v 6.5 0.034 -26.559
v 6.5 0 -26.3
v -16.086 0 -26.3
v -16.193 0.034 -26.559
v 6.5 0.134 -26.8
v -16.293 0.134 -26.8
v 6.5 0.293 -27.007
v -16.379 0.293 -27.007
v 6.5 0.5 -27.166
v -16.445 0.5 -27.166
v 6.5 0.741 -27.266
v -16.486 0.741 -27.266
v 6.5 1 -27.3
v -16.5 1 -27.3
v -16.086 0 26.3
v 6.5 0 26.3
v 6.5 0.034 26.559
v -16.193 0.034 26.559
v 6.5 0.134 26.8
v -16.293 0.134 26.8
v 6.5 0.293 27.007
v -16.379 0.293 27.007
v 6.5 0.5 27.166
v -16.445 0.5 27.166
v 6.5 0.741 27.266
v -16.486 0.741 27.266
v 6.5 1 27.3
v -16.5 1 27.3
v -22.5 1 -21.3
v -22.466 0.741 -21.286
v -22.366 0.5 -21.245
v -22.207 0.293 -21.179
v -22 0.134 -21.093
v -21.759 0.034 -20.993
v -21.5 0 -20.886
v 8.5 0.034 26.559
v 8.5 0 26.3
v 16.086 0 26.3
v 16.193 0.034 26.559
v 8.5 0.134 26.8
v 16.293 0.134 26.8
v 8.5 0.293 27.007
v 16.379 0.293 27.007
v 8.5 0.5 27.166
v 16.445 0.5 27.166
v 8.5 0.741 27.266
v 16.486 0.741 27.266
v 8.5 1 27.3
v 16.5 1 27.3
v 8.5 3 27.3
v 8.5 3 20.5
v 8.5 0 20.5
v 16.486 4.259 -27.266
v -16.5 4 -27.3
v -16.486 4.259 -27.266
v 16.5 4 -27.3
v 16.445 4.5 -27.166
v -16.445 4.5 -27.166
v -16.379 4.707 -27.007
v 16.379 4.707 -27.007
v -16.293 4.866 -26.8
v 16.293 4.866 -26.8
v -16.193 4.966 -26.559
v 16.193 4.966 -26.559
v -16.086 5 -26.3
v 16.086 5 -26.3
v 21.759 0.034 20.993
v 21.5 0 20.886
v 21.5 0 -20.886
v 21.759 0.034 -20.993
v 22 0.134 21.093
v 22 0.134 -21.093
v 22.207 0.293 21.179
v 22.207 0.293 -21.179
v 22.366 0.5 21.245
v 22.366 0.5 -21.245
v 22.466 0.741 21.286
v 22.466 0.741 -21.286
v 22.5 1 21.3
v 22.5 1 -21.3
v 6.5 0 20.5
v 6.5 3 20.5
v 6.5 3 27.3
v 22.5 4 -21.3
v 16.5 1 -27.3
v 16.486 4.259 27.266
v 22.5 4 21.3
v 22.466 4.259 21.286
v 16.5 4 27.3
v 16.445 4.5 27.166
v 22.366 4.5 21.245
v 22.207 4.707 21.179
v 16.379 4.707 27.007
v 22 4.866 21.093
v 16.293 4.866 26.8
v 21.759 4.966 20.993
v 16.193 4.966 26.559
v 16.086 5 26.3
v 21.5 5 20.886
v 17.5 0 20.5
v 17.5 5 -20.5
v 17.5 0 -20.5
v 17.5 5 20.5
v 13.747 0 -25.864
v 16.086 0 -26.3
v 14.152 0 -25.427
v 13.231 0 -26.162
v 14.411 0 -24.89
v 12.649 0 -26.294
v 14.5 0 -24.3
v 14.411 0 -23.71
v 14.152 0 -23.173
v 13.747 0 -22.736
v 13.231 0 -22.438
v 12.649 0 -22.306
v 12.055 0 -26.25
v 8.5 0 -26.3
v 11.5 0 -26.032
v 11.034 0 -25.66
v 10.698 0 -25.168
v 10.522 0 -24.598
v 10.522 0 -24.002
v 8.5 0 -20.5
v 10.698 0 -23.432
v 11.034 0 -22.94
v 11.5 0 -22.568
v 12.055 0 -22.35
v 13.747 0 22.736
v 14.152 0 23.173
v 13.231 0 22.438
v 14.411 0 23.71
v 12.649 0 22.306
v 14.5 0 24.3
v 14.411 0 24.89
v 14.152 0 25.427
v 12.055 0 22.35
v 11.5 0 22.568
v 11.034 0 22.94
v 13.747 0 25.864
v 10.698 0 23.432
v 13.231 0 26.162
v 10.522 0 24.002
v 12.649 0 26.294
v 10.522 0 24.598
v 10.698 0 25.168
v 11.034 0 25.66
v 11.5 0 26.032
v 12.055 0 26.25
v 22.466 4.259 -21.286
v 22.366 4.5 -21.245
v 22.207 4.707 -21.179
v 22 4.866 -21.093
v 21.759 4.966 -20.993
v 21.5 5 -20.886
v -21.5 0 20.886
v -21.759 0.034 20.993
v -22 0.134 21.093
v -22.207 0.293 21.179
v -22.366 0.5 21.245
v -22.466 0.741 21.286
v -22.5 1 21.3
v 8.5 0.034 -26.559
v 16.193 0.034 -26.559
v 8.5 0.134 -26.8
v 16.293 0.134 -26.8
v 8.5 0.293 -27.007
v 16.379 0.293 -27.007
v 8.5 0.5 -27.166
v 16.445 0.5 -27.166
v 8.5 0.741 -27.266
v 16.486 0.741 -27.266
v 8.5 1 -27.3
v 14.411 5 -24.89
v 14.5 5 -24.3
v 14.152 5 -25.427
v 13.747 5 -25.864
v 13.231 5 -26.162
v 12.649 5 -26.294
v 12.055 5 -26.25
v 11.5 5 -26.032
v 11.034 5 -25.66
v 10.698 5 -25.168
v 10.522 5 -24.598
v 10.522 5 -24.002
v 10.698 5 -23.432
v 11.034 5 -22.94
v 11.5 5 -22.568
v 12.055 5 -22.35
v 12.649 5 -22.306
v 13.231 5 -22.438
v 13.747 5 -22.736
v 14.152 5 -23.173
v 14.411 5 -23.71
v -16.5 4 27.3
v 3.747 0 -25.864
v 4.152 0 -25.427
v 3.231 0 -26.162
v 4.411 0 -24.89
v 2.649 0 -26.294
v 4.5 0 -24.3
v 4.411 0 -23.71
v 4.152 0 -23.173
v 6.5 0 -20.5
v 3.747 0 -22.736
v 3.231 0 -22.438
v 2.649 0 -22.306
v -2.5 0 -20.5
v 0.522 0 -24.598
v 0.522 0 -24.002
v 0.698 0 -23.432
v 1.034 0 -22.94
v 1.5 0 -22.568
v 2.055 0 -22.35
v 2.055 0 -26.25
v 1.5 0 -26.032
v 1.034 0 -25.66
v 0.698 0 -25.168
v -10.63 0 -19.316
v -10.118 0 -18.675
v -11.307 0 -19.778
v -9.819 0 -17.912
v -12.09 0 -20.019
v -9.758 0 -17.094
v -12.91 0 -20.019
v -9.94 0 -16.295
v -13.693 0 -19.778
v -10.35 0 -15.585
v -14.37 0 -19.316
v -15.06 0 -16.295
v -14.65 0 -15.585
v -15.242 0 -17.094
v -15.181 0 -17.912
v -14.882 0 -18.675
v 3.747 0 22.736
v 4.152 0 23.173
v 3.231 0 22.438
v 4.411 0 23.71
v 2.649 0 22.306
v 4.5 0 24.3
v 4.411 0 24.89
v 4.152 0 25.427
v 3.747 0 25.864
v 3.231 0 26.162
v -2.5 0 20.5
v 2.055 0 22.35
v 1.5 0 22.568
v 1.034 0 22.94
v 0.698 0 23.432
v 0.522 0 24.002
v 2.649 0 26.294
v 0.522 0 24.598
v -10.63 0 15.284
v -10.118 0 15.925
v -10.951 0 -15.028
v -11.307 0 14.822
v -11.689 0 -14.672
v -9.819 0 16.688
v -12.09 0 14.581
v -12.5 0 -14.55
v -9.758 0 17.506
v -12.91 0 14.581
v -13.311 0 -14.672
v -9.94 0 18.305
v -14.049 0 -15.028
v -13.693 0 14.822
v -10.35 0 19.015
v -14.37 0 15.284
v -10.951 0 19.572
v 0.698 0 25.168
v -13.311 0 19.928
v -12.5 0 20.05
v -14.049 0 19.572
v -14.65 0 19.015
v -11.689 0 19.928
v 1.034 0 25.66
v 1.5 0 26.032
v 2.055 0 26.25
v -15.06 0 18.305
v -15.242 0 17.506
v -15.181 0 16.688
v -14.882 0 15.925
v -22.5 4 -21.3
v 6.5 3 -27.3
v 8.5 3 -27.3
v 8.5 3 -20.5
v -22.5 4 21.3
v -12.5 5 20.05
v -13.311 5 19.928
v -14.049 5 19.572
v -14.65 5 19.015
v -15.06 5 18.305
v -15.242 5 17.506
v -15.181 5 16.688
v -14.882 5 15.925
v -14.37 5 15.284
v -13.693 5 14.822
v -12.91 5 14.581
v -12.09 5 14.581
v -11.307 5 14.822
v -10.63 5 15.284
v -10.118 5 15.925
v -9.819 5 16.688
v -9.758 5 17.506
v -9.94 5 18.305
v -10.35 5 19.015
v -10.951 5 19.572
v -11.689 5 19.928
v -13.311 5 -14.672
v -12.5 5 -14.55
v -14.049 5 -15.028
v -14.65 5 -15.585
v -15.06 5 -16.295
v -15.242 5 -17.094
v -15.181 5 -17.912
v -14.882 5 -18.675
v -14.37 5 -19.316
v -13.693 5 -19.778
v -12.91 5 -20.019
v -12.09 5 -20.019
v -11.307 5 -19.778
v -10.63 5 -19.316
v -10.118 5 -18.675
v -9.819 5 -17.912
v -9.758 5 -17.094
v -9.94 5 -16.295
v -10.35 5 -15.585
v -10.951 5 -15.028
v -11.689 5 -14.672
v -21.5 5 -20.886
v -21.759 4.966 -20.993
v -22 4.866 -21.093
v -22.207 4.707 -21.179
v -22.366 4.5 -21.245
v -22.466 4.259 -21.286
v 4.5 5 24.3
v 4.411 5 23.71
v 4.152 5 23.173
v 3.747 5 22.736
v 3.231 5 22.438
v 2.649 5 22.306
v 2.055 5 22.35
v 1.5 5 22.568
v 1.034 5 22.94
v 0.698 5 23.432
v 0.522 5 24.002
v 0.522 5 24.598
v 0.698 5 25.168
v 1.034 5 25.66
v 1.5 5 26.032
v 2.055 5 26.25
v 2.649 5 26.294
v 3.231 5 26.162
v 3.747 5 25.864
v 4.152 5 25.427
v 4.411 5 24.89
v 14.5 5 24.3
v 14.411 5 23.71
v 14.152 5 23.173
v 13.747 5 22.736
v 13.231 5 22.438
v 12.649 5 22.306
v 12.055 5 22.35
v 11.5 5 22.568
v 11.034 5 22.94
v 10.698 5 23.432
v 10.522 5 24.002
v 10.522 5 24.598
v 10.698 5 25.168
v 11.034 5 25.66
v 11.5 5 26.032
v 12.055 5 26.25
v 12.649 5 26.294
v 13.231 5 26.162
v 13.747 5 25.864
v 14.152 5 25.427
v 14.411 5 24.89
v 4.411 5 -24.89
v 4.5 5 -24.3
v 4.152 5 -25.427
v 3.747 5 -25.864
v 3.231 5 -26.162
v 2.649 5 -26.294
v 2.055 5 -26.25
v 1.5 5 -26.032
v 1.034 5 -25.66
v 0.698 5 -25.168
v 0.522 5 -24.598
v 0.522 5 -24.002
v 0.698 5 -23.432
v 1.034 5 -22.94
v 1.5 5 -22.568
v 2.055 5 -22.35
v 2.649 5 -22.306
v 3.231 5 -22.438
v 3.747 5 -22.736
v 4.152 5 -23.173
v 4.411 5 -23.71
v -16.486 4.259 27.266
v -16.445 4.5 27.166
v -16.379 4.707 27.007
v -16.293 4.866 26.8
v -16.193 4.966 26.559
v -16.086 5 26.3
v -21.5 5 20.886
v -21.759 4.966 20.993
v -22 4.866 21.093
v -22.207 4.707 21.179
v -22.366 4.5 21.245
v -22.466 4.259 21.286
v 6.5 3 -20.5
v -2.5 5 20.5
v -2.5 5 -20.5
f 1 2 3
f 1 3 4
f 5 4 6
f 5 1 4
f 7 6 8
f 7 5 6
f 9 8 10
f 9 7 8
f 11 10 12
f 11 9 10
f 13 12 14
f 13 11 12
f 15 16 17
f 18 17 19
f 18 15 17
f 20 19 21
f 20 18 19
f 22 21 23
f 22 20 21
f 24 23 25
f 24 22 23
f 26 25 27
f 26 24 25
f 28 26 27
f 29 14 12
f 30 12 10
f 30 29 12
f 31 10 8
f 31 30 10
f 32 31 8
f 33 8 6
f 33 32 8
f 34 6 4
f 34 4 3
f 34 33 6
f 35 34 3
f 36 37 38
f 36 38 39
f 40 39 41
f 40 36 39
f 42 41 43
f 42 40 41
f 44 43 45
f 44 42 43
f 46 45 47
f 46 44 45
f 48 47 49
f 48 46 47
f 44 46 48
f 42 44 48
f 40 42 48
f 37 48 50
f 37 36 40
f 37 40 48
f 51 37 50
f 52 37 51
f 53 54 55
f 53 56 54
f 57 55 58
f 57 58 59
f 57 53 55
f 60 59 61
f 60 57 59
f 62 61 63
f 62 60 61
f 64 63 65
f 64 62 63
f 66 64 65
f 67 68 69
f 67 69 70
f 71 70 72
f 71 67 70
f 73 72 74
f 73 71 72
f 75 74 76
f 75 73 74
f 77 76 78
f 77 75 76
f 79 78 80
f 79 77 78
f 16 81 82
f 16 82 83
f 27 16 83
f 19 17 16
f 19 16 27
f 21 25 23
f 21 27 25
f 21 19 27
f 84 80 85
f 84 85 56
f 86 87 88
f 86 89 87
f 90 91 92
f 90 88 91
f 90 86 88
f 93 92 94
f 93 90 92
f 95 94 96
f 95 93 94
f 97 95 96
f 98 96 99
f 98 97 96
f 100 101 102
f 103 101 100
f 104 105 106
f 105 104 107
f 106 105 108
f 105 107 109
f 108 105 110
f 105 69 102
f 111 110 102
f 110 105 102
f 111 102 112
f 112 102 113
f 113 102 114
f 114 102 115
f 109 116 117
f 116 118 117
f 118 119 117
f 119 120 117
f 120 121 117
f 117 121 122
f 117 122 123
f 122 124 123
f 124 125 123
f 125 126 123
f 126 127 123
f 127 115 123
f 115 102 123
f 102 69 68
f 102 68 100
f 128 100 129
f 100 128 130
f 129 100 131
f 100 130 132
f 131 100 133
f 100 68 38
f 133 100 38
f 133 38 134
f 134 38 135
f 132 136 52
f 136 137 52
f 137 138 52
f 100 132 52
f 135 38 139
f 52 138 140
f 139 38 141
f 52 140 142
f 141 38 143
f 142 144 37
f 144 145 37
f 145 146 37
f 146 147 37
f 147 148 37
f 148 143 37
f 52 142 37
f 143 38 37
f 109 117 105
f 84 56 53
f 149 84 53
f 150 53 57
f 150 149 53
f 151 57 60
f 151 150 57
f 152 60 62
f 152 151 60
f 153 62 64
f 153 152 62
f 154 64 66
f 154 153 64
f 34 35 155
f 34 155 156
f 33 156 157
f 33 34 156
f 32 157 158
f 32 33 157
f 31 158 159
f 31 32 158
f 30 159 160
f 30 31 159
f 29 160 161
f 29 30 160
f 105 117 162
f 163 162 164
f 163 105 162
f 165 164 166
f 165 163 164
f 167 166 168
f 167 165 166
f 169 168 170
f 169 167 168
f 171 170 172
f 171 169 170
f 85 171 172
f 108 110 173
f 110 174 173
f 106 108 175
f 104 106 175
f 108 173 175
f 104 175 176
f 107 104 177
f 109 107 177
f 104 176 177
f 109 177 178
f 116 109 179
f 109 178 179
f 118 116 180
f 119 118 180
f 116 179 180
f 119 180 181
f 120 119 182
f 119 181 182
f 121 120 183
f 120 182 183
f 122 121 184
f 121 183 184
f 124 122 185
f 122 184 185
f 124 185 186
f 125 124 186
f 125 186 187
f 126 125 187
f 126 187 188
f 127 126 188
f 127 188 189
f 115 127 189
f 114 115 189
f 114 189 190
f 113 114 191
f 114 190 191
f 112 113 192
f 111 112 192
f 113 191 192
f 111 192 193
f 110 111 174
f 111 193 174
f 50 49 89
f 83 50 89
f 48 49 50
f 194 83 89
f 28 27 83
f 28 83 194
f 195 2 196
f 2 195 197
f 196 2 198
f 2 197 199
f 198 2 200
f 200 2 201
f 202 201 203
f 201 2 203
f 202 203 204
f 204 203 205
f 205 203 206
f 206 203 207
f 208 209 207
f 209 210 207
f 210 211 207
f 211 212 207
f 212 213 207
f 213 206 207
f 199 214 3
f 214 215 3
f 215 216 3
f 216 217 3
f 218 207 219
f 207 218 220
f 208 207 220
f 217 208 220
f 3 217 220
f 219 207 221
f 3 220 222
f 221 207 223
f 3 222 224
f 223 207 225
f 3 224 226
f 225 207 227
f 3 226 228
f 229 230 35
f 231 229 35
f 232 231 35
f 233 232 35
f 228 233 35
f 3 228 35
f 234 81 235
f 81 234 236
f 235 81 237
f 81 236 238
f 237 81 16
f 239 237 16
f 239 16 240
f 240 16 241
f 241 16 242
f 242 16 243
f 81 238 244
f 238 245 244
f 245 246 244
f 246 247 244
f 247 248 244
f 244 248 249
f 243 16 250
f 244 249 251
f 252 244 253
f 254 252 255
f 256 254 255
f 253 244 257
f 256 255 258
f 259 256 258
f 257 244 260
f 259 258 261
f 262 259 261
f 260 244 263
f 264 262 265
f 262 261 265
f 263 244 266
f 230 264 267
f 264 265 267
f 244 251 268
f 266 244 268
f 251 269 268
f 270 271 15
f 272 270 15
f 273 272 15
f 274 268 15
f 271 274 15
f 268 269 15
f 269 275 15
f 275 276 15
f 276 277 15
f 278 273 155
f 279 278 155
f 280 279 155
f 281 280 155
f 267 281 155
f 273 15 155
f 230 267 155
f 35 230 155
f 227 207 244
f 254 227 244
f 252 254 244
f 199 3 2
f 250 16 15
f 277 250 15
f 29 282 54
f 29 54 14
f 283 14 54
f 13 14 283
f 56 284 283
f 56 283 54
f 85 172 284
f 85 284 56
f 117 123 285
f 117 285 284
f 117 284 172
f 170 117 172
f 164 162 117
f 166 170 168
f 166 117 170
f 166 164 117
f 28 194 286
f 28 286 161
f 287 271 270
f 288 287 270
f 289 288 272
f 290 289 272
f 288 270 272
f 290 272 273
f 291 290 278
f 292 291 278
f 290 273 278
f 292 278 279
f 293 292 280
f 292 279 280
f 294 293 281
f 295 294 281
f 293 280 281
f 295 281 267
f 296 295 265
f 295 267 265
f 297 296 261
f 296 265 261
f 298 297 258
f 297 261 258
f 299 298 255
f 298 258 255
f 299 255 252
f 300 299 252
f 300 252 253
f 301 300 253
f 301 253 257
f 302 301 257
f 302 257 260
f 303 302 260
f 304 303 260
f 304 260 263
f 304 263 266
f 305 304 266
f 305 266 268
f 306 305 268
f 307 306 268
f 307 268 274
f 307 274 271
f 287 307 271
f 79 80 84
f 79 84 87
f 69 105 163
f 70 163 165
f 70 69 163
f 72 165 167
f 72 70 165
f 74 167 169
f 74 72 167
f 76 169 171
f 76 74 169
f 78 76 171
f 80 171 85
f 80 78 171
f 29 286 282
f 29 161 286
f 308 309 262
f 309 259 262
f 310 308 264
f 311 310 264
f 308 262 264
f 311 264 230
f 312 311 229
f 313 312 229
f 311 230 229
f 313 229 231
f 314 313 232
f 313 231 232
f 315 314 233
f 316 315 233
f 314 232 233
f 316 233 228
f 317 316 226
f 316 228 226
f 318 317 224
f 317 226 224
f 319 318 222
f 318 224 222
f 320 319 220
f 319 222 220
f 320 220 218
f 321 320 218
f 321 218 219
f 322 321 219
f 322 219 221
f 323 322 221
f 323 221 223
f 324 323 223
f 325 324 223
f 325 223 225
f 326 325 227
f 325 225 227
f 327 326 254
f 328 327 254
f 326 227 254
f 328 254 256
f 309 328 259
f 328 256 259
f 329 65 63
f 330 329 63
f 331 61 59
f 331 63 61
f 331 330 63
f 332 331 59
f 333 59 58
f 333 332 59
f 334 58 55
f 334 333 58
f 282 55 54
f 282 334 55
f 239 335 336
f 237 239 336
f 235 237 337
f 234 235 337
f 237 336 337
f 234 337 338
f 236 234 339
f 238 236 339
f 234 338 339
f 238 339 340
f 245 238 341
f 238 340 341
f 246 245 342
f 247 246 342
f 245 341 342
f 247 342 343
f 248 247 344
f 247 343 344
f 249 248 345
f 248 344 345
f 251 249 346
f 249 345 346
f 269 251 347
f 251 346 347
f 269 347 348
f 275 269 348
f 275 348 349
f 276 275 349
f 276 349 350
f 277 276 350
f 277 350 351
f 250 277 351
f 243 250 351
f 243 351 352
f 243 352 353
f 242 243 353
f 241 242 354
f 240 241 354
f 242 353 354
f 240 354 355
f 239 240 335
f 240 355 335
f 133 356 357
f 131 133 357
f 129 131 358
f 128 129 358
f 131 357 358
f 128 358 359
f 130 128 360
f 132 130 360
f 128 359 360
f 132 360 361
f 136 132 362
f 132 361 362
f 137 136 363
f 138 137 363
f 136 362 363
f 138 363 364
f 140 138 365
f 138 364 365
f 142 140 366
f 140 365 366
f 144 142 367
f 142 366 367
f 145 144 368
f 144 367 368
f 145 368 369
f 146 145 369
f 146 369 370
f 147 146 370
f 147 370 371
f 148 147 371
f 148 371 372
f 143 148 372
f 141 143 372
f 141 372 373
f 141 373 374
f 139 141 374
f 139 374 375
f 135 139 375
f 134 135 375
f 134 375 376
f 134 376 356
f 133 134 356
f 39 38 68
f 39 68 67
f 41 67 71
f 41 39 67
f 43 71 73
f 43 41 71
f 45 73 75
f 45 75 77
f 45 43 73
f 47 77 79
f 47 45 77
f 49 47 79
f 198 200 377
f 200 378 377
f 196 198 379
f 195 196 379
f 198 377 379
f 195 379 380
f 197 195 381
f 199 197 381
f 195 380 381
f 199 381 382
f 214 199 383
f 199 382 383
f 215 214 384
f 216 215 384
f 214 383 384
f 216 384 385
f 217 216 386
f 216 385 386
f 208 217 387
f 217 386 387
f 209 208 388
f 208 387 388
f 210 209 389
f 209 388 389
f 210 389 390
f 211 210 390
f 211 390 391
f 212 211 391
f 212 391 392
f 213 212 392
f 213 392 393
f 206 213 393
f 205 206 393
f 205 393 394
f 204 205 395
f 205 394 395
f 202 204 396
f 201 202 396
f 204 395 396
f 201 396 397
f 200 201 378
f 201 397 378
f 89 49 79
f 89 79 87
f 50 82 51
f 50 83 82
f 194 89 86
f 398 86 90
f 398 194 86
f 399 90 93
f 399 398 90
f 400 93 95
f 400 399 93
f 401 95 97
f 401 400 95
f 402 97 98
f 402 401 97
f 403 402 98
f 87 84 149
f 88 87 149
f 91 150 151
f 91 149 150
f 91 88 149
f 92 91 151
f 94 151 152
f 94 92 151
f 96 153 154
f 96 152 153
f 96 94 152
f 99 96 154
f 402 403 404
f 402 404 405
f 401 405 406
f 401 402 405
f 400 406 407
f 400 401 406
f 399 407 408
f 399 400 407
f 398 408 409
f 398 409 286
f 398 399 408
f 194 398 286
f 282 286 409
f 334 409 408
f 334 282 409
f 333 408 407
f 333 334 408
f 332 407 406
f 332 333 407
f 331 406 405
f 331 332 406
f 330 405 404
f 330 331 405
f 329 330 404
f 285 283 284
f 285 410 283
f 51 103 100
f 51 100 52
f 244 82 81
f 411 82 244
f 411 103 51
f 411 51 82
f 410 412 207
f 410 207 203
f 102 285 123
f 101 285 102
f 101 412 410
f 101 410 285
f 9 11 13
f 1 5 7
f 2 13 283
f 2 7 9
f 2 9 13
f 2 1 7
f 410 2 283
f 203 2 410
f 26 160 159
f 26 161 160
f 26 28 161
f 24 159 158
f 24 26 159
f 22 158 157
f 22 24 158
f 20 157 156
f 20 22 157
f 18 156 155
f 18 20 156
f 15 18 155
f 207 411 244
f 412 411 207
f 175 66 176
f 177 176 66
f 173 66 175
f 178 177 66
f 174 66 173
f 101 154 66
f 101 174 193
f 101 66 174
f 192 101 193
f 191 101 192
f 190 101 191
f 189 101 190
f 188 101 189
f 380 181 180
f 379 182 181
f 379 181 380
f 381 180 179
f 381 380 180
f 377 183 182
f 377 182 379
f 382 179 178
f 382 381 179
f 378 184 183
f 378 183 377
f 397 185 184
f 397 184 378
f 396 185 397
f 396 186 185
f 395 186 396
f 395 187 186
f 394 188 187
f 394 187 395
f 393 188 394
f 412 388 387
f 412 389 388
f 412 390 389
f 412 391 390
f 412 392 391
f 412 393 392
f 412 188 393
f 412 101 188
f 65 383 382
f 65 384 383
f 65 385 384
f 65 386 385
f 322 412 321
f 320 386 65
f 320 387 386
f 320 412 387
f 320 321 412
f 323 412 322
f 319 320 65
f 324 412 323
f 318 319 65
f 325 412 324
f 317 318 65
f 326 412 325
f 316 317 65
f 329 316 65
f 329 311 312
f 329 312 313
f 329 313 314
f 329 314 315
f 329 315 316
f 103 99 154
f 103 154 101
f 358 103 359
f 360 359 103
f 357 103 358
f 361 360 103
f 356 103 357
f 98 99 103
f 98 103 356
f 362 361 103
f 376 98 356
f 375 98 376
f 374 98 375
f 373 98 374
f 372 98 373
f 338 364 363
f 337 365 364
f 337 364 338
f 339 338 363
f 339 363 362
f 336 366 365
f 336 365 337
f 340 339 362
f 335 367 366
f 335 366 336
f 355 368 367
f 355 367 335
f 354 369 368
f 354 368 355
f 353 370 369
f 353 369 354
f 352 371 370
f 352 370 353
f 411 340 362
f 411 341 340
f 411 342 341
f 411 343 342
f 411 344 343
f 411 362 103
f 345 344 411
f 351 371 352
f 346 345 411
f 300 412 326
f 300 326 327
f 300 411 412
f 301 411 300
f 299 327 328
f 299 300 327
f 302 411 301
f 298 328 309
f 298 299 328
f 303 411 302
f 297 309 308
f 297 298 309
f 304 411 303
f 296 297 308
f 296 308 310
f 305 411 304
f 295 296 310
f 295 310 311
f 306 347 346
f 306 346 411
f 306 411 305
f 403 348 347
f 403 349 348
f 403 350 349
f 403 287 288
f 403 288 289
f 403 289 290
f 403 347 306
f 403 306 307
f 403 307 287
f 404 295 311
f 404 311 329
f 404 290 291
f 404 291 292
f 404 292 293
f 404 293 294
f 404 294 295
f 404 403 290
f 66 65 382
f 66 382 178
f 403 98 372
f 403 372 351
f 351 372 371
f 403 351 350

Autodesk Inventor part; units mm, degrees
ref_plane "YZ Plane" through (0, 0, 0) normal (1, 0, 0) x (0, 1, 0)
ref_plane "XZ Plane" through (0, 0, 0) normal (0, 1, 0) x (-1, 0, 0)
ref_plane "XY Plane" through (0, 0, 0) normal (0, 0, 1) x (1, 0, 0)
sketch "スケッチ1" plane through (0, 0, 0) normal (0, 1, 0) x (-1, 0, 0)
  line L0 (22.5, -27.3) -> (-22.5, -27.3)
  line L1 (-22.5, -27.3) -> (-22.5, 27.3)
  line L2 (-22.5, 27.3) -> (22.5, 27.3)
  line L3 (22.5, 27.3) -> (22.5, -27.3)
  line L4 (22.5, -27.3) -> (-22.5, 27.3) construction
  line L5 (-22.5, -27.3) -> (22.5, 27.3) construction
  point P0 (0, 0)
  dimension "d0" = 45
  dimension "d1" = 54.6
extrude "押し出し1" add sketch "スケッチ1" along normal blind 5
sketch "スケッチ2" plane through (0, 5, 0) normal (0, 1, 0) x (1, 0, 0)
  line L0 (-22.5, 27.3) -> (-22.5, -27.3) projected
  line L1 (-22.5, -27.3) -> (22.5, -27.3) projected
  line L2 (22.5, 27.3) -> (-22.5, 27.3) projected
  point P0 (0, 0)
  point P1 (-12.5, -17.3)
  point P2 (-12.5, 17.3)
  dimension "d4" = 10
  dimension "d5" = 10
  dimension "d6" = 10
hole "穴1" at (-12.5, 5, 17.3) at (-12.5, 5, -17.3) direction (0, -1, 0) diameter 5.5 end through all clearance for "Flat Head Machine Screw" size "M5" standard "Ansi Metric M Profile"
sketch "スケッチ3" plane through (0, 5, 0) normal (0, 1, 0) x (1, 0, 0)
  line L0 (-2.5, 20.5) -> (17.5, 20.5)
  line L1 (17.5, 20.5) -> (17.5, -20.5)
  line L2 (17.5, -20.5) -> (-2.5, -20.5)
  line L3 (-2.5, -20.5) -> (-2.5, 20.5)
  line L4 (-2.5, 20.5) -> (17.5, -20.5) construction
  line L5 (17.5, 20.5) -> (-2.5, -20.5) construction
  line L6 (22.5, -27.3) -> (22.5, 27.3) projected
  circle A0 centre (2.5, -24.3) radius 2
  circle A1 centre (2.5, 24.3) radius 2
  circle A2 centre (12.5, 24.3) radius 2
  circle A3 centre (12.5, -24.3) radius 2
  point P0 (0, 0)
  point P1 (7.5, 0)
  point P2 (7.5, 0)
  dimension "d14" = 5
  dimension "d15" = 41
  dimension "d16" = 20
  dimension "d17" = 24.3
  dimension "d18" = 5
  dimension "d19" = 4
  dimension "d22" = 48.6
  dimension "d29" = 10
extrude "押し出し2" cut sketch "スケッチ3" against normal through all
sketch "スケッチ4" plane through (0, 0, 0) normal (0, -1, 0) x (1, 0, 0)
  line L0 (8.5, -35) -> (6.5, -35)
  line L1 (6.5, -35) -> (6.5, 35)
  line L2 (6.5, 35) -> (8.5, 35)
  line L3 (8.5, 35) -> (8.5, -35)
  line L4 (8.5, -35) -> (6.5, 35) construction
  line L5 (6.5, -35) -> (8.5, 35) construction
  line L6 (17.5, -20.5) -> (-2.5, -20.5) projected
  point P0 (0, 0)
  point P1 (7.5, 0)
  point P2 (7.5, -20.5)
  point P3 (7.5, 0)
  point P4 (6.5, -20.5)
  point P5 (8.5, -20.5)
  dimension "d36" = 2
  dimension "d37" = 70
extrude "押し出し3" cut sketch "スケッチ4" against normal blind 3
chamfer "面取り1" distance 6 angle 45 4 edges at (22.5, 2.5, -27.3) (22.5, 2.5, 27.3) (-22.5, 2.5, -27.3) (-22.5, 2.5, 27.3)
fillet "フィレット1" radius 1 18 edges at (-22.5, 5, 0) (0, 5, 27.3) (-19.5, 5, 24.3) (19.5, 5, 24.3) (22.5, 5, 0) (19.5, 5, -24.3) (0, 5, -27.3) (-19.5, 5, -24.3) (-22.5, 0, 0) (-19.5, 0, 24.3) (-5, 0, 27.3) (12.5, 0, 27.3) (19.5, 0, 24.3) (22.5, 0, 0) (19.5, 0, -24.3) (12.5, 0, -27.3) (-5, 0, -27.3) (-19.5, 0, -24.3)
equation "\"d6\" = d5"
equation "\"d22\" = 2 * d17"
equation "\"d29\" = 2 * d18"
properties part number "base1" material "ABS プラスチック"
